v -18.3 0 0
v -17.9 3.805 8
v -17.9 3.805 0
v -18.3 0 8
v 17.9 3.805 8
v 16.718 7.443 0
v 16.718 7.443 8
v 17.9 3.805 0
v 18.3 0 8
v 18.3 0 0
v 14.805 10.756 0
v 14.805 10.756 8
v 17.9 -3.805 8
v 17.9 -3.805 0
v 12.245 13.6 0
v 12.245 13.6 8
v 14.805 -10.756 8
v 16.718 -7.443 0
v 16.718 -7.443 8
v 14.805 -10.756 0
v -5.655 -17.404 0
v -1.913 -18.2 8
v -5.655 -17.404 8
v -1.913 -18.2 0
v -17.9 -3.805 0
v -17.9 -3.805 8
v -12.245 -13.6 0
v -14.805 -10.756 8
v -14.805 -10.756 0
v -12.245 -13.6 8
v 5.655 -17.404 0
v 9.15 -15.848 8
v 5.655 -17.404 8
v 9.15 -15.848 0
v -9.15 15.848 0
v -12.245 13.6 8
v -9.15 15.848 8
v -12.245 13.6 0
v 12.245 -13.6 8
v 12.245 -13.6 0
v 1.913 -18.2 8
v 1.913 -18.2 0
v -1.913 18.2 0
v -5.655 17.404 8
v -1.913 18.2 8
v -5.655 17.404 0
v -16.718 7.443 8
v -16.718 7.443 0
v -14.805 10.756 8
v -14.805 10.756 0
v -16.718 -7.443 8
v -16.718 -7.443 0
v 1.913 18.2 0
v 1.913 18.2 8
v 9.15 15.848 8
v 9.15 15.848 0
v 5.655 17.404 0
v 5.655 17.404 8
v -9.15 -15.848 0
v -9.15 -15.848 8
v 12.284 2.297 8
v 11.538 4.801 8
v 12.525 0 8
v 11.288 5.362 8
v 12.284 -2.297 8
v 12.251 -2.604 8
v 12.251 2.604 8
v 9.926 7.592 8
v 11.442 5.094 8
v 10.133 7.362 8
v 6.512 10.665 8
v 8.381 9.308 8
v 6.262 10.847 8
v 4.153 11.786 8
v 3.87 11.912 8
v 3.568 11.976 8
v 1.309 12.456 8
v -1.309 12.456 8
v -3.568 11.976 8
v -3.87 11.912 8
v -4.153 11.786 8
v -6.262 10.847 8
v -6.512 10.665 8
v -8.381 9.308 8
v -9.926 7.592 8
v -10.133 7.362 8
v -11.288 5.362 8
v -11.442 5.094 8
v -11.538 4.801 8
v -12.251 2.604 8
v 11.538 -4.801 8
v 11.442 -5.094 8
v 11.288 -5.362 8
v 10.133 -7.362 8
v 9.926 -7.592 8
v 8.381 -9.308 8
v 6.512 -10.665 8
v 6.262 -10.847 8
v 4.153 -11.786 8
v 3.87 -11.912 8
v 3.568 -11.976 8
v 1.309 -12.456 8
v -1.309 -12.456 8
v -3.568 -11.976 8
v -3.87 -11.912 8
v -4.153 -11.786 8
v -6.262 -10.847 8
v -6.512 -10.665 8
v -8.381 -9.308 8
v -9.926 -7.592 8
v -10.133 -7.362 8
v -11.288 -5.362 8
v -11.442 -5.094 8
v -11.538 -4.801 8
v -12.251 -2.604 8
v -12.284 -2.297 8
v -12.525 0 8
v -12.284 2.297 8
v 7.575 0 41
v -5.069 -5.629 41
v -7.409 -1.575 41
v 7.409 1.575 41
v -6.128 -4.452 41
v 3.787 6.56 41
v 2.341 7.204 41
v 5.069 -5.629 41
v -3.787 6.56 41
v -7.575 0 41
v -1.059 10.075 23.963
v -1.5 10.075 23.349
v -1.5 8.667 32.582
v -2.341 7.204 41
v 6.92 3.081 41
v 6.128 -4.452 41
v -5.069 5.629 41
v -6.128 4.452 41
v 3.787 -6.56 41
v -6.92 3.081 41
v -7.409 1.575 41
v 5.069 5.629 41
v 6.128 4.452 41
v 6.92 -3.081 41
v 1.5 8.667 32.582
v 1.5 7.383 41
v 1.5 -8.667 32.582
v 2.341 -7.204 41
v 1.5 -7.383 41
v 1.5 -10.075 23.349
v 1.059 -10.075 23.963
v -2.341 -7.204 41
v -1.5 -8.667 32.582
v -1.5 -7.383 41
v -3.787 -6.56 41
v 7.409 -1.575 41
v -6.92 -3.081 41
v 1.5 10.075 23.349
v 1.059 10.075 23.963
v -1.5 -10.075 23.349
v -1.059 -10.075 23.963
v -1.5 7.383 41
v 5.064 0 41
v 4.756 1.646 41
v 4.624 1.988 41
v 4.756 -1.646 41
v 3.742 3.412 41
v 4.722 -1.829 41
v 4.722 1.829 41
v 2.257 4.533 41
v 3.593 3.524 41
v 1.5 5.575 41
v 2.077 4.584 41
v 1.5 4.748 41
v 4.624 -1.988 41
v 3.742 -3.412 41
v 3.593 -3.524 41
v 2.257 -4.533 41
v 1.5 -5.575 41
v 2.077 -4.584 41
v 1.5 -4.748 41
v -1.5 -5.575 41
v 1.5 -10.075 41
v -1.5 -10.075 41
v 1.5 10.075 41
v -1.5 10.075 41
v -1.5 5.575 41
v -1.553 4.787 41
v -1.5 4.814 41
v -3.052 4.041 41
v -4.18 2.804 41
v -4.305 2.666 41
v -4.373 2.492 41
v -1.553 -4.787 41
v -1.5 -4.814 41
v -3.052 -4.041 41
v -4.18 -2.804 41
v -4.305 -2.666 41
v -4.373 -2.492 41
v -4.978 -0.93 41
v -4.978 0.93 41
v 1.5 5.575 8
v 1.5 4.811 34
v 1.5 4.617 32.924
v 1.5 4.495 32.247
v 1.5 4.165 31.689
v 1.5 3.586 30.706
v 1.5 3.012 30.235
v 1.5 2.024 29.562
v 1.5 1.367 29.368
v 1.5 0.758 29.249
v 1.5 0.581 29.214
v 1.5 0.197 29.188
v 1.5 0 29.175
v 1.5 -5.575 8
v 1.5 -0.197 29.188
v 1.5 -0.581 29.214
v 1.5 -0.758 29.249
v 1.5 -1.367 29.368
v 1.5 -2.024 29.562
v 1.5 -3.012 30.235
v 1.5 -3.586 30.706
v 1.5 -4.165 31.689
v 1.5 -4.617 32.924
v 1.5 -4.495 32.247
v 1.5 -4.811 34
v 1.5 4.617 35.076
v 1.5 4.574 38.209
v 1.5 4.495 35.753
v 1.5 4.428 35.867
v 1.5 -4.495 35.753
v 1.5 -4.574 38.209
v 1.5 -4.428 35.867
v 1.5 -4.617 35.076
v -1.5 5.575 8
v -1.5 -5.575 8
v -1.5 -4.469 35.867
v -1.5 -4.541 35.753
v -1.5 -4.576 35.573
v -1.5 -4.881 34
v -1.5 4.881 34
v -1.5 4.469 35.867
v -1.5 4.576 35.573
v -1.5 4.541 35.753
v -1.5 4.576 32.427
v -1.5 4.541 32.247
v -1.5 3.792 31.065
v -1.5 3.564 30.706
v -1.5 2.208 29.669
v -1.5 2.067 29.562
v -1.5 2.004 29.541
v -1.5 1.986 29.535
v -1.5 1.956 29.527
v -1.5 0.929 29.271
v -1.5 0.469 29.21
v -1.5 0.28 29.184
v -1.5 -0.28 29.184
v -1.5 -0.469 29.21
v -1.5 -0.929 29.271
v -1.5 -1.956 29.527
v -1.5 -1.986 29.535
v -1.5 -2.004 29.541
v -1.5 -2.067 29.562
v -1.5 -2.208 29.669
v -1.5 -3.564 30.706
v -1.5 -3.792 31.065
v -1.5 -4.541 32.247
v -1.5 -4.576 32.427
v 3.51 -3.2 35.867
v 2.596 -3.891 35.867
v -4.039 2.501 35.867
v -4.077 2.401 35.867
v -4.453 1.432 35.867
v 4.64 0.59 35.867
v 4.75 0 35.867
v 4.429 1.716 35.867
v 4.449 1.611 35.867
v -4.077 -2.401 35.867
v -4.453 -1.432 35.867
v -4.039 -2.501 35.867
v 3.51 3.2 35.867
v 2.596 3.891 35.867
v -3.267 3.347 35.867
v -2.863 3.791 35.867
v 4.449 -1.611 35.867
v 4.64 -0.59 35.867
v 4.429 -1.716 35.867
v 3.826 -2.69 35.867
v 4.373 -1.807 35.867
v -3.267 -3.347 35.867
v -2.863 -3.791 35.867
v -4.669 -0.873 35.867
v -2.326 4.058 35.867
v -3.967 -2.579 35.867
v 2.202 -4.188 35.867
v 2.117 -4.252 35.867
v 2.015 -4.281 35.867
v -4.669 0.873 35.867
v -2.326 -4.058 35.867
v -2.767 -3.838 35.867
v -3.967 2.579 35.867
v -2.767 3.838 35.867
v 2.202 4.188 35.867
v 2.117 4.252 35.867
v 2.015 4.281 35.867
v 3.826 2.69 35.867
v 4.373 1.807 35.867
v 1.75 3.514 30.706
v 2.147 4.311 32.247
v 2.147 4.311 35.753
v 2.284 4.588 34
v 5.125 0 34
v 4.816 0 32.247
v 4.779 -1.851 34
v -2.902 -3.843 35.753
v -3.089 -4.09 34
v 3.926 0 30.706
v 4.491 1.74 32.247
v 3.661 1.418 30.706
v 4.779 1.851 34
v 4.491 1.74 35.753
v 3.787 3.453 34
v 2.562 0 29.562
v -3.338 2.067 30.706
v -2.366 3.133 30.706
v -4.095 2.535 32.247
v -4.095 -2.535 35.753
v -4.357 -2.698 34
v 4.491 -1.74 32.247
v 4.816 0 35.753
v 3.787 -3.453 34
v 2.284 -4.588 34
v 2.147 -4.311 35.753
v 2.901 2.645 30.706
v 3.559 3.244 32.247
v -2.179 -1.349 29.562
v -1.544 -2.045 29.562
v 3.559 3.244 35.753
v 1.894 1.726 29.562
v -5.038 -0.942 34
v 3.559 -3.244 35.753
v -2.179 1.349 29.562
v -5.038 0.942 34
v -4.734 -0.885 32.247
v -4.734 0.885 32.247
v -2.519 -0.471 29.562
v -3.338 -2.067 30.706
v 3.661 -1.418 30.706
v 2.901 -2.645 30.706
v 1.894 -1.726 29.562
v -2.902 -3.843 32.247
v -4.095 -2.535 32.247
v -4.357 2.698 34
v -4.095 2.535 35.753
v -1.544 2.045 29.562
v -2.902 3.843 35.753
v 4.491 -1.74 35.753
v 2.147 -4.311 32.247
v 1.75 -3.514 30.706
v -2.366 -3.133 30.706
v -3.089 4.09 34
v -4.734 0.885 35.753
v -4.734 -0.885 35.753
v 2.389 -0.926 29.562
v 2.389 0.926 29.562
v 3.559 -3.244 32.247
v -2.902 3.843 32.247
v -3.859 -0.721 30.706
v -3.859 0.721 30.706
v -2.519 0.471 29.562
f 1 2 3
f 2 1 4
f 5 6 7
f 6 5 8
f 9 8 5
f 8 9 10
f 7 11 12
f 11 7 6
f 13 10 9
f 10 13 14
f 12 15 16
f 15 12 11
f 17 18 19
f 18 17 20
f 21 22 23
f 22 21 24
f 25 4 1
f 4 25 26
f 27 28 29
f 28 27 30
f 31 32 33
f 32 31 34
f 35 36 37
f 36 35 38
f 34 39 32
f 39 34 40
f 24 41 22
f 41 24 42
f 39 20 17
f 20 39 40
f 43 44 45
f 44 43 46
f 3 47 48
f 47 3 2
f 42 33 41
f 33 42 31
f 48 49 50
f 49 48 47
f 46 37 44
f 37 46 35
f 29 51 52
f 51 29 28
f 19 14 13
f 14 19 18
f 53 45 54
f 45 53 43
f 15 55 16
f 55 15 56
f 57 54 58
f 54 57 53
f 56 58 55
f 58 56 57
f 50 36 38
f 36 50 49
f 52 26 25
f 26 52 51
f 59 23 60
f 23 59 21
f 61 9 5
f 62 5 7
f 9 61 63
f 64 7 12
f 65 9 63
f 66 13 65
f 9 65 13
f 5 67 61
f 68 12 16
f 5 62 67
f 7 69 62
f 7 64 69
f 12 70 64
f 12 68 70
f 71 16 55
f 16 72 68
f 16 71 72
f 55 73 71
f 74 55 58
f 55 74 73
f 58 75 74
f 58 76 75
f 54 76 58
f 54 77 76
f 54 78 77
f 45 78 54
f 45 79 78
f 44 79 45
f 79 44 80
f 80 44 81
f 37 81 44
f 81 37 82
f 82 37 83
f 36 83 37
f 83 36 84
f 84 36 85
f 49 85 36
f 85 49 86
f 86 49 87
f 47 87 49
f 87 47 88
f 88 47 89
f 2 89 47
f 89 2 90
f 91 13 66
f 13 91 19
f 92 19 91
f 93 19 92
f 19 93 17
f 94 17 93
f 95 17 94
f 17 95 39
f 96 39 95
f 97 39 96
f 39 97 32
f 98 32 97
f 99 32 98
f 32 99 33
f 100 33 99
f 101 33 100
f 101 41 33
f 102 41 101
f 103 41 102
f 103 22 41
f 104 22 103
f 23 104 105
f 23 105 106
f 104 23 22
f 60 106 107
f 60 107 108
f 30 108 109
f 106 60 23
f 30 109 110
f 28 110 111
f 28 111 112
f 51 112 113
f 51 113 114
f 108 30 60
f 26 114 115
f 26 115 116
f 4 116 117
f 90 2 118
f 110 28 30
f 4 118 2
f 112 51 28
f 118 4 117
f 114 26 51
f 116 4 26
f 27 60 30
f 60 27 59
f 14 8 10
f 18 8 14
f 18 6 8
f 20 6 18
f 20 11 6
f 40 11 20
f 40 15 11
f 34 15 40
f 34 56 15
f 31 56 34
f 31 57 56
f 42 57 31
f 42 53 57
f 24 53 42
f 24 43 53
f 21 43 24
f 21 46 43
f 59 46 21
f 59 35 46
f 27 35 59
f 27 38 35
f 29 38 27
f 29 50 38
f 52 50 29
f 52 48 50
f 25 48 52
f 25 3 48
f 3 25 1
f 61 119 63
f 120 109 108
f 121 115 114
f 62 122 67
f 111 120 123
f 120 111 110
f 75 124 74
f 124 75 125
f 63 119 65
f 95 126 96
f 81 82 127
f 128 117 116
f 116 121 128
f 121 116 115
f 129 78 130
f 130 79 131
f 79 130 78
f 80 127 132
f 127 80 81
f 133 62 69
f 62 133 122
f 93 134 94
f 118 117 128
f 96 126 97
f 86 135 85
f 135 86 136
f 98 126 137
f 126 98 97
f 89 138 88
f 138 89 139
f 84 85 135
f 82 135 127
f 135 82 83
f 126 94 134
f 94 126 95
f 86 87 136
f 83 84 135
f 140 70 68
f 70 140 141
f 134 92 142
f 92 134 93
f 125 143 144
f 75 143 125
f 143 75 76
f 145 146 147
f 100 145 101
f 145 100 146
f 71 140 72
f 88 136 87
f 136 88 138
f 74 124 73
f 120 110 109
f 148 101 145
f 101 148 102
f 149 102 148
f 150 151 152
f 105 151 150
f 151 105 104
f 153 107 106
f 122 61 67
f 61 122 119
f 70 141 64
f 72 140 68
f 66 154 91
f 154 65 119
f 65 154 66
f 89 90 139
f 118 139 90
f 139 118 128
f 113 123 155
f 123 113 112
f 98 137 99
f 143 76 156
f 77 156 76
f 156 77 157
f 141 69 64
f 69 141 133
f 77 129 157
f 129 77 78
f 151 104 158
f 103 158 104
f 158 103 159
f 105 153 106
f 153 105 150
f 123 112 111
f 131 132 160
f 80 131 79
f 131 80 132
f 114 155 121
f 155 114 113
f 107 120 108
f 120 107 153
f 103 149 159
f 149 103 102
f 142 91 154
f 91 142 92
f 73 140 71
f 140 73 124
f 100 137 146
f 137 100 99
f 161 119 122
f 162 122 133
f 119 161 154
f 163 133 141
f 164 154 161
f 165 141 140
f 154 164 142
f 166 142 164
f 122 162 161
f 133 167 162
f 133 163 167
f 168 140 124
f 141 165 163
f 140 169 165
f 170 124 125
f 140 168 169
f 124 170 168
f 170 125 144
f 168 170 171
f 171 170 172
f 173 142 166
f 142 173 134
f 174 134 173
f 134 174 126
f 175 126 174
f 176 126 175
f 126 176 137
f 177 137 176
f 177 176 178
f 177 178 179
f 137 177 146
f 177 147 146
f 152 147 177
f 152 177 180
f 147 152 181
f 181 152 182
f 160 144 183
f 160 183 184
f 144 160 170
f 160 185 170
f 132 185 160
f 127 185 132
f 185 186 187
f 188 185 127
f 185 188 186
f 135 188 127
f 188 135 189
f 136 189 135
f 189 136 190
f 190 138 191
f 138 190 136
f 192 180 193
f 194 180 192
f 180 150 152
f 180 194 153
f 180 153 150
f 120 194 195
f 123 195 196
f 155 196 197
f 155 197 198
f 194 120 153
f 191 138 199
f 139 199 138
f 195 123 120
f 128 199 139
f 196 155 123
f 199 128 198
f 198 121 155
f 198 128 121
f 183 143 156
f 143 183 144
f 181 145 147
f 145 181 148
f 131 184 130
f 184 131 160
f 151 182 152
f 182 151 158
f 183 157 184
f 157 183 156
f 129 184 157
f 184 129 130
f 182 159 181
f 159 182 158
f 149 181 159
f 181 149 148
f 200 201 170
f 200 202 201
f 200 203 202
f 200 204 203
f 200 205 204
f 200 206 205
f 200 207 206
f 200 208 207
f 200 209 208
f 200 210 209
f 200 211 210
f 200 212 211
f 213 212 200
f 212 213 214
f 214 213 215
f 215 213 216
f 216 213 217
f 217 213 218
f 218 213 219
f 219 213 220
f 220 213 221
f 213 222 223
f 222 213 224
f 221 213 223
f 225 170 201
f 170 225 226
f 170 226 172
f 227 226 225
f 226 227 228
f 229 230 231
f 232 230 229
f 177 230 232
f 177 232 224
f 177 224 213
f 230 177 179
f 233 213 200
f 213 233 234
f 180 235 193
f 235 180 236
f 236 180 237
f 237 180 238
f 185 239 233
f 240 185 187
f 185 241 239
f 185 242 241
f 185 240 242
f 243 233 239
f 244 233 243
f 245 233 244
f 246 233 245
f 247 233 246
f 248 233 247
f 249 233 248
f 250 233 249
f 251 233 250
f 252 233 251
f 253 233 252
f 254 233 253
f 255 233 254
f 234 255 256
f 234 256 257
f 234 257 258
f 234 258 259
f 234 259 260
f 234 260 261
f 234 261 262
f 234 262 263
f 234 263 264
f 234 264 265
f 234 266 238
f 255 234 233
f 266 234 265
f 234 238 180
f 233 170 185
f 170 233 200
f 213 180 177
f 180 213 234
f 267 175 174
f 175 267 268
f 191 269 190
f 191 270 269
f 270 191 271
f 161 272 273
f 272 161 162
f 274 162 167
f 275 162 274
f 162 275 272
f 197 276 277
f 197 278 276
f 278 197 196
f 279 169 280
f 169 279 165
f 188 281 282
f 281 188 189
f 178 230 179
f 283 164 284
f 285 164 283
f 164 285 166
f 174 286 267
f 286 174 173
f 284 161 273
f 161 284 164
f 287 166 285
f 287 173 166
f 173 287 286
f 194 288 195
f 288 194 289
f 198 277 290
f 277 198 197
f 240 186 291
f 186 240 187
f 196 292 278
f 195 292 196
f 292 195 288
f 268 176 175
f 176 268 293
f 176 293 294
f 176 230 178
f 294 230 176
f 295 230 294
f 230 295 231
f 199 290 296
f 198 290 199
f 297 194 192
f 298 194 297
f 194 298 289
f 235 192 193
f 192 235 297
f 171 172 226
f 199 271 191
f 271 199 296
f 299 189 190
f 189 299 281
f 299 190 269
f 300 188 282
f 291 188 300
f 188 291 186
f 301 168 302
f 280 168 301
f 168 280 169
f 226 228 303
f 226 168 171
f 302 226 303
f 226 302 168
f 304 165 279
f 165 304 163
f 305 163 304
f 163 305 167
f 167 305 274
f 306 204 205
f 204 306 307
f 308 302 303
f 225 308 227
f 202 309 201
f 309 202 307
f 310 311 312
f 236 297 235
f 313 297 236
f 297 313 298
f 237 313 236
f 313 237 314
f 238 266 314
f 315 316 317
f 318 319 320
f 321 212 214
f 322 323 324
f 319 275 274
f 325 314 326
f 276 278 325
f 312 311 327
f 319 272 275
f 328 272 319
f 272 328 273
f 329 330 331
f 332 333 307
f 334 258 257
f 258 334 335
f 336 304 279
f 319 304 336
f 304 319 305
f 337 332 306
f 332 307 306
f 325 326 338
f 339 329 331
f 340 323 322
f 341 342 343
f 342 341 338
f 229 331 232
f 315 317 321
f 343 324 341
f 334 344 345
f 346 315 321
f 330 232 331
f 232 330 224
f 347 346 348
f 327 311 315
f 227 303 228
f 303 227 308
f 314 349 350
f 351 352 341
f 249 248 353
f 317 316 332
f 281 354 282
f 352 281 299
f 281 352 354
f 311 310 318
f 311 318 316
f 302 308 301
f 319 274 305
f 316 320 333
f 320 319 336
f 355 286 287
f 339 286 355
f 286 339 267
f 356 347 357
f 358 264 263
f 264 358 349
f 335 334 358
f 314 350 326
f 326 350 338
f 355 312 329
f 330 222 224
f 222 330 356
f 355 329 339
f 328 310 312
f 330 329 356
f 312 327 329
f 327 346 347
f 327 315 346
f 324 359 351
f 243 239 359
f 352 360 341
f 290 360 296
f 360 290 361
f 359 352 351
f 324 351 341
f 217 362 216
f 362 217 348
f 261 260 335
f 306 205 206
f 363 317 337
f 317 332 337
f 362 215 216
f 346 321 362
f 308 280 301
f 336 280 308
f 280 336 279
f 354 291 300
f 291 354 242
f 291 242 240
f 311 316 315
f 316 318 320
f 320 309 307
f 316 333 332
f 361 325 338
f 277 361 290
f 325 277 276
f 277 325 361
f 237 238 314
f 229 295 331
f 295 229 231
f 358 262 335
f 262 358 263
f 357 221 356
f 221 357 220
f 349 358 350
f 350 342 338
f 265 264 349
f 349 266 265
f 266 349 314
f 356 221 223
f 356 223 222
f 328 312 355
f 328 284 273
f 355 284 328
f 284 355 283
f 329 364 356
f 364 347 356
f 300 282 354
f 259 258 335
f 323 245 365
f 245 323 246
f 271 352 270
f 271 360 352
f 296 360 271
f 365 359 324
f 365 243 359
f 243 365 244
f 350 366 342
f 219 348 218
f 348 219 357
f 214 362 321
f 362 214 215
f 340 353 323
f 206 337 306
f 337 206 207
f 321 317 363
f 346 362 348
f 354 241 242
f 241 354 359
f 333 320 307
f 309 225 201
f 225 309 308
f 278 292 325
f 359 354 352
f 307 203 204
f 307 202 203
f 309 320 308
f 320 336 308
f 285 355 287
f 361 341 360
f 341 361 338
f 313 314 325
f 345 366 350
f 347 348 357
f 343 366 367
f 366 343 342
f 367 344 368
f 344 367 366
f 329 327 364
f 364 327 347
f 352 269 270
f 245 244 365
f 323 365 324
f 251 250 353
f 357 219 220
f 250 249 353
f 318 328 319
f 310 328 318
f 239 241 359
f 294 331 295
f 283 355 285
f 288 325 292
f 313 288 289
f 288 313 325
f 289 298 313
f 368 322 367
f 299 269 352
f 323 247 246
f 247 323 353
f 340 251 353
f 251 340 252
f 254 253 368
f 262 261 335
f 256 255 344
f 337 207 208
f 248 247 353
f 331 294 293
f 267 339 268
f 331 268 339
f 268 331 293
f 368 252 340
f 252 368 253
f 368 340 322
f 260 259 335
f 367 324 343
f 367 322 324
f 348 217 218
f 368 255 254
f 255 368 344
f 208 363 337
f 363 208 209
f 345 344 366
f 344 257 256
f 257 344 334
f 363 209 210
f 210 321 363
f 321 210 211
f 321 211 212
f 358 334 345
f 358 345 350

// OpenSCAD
//Diameter of knife handle in mm
tool_diameter = 9.15; // My x-acto gripster
tool_rad = tool_diameter / 2;
//Base is this many times handle radius
base_multiplier = 4;
//Height of base (bottom disk) in mm
base_height = 8;
//Height of conical cap
cap_height = 41;
//Base of cap is this many times handle radius
cap_base_multiplier = 3;
//Width of wall at top of cap in mm
cap_top_wall_width = 1.5;
//Extra space to adjust for tight or loose fit
tool_space_margin = 0.55;
//Depth of handle hole in mm
handle_hole_depth = 8;
//Width of cutout for blade
blade_hole_width = 3;
//Size of ridge showing orientation of blade in mm
orientation_ridge_size = 4;
//$fn=90; //uncomment for pretty preview render
difference()
{
	union()
	{
		//Base
		cylinder(r=tool_rad*base_multiplier, 
            h=base_height);

		//Cap
		cylinder(h=cap_height,
            r1=tool_rad*cap_base_multiplier, 
            r2=tool_rad+cap_top_wall_width*2);
        
        //Orientation Ridge
        translate([-blade_hole_width/2,
            -(tool_rad+cap_top_wall_width+orientation_ridge_size),])
        cube([blade_hole_width,
            (tool_rad+cap_top_wall_width+orientation_ridge_size)*2,
            cap_height,
            ]);
        
	}

	//Blade
	translate([-blade_hole_width/2,-(tool_rad+1),base_height])
	cube([blade_hole_width,(tool_rad+1)*2,cap_height]);

	//Top Opening
	translate([0,0,cap_height-handle_hole_depth])
	cylinder(r1=tool_rad,
        r2=tool_rad+tool_space_margin,
        h=handle_hole_depth+1);

	//Rounded resting area for knife
	translate([0,0,cap_height-handle_hole_depth+1])
	sphere(r=tool_rad+tool_space_margin);
}
